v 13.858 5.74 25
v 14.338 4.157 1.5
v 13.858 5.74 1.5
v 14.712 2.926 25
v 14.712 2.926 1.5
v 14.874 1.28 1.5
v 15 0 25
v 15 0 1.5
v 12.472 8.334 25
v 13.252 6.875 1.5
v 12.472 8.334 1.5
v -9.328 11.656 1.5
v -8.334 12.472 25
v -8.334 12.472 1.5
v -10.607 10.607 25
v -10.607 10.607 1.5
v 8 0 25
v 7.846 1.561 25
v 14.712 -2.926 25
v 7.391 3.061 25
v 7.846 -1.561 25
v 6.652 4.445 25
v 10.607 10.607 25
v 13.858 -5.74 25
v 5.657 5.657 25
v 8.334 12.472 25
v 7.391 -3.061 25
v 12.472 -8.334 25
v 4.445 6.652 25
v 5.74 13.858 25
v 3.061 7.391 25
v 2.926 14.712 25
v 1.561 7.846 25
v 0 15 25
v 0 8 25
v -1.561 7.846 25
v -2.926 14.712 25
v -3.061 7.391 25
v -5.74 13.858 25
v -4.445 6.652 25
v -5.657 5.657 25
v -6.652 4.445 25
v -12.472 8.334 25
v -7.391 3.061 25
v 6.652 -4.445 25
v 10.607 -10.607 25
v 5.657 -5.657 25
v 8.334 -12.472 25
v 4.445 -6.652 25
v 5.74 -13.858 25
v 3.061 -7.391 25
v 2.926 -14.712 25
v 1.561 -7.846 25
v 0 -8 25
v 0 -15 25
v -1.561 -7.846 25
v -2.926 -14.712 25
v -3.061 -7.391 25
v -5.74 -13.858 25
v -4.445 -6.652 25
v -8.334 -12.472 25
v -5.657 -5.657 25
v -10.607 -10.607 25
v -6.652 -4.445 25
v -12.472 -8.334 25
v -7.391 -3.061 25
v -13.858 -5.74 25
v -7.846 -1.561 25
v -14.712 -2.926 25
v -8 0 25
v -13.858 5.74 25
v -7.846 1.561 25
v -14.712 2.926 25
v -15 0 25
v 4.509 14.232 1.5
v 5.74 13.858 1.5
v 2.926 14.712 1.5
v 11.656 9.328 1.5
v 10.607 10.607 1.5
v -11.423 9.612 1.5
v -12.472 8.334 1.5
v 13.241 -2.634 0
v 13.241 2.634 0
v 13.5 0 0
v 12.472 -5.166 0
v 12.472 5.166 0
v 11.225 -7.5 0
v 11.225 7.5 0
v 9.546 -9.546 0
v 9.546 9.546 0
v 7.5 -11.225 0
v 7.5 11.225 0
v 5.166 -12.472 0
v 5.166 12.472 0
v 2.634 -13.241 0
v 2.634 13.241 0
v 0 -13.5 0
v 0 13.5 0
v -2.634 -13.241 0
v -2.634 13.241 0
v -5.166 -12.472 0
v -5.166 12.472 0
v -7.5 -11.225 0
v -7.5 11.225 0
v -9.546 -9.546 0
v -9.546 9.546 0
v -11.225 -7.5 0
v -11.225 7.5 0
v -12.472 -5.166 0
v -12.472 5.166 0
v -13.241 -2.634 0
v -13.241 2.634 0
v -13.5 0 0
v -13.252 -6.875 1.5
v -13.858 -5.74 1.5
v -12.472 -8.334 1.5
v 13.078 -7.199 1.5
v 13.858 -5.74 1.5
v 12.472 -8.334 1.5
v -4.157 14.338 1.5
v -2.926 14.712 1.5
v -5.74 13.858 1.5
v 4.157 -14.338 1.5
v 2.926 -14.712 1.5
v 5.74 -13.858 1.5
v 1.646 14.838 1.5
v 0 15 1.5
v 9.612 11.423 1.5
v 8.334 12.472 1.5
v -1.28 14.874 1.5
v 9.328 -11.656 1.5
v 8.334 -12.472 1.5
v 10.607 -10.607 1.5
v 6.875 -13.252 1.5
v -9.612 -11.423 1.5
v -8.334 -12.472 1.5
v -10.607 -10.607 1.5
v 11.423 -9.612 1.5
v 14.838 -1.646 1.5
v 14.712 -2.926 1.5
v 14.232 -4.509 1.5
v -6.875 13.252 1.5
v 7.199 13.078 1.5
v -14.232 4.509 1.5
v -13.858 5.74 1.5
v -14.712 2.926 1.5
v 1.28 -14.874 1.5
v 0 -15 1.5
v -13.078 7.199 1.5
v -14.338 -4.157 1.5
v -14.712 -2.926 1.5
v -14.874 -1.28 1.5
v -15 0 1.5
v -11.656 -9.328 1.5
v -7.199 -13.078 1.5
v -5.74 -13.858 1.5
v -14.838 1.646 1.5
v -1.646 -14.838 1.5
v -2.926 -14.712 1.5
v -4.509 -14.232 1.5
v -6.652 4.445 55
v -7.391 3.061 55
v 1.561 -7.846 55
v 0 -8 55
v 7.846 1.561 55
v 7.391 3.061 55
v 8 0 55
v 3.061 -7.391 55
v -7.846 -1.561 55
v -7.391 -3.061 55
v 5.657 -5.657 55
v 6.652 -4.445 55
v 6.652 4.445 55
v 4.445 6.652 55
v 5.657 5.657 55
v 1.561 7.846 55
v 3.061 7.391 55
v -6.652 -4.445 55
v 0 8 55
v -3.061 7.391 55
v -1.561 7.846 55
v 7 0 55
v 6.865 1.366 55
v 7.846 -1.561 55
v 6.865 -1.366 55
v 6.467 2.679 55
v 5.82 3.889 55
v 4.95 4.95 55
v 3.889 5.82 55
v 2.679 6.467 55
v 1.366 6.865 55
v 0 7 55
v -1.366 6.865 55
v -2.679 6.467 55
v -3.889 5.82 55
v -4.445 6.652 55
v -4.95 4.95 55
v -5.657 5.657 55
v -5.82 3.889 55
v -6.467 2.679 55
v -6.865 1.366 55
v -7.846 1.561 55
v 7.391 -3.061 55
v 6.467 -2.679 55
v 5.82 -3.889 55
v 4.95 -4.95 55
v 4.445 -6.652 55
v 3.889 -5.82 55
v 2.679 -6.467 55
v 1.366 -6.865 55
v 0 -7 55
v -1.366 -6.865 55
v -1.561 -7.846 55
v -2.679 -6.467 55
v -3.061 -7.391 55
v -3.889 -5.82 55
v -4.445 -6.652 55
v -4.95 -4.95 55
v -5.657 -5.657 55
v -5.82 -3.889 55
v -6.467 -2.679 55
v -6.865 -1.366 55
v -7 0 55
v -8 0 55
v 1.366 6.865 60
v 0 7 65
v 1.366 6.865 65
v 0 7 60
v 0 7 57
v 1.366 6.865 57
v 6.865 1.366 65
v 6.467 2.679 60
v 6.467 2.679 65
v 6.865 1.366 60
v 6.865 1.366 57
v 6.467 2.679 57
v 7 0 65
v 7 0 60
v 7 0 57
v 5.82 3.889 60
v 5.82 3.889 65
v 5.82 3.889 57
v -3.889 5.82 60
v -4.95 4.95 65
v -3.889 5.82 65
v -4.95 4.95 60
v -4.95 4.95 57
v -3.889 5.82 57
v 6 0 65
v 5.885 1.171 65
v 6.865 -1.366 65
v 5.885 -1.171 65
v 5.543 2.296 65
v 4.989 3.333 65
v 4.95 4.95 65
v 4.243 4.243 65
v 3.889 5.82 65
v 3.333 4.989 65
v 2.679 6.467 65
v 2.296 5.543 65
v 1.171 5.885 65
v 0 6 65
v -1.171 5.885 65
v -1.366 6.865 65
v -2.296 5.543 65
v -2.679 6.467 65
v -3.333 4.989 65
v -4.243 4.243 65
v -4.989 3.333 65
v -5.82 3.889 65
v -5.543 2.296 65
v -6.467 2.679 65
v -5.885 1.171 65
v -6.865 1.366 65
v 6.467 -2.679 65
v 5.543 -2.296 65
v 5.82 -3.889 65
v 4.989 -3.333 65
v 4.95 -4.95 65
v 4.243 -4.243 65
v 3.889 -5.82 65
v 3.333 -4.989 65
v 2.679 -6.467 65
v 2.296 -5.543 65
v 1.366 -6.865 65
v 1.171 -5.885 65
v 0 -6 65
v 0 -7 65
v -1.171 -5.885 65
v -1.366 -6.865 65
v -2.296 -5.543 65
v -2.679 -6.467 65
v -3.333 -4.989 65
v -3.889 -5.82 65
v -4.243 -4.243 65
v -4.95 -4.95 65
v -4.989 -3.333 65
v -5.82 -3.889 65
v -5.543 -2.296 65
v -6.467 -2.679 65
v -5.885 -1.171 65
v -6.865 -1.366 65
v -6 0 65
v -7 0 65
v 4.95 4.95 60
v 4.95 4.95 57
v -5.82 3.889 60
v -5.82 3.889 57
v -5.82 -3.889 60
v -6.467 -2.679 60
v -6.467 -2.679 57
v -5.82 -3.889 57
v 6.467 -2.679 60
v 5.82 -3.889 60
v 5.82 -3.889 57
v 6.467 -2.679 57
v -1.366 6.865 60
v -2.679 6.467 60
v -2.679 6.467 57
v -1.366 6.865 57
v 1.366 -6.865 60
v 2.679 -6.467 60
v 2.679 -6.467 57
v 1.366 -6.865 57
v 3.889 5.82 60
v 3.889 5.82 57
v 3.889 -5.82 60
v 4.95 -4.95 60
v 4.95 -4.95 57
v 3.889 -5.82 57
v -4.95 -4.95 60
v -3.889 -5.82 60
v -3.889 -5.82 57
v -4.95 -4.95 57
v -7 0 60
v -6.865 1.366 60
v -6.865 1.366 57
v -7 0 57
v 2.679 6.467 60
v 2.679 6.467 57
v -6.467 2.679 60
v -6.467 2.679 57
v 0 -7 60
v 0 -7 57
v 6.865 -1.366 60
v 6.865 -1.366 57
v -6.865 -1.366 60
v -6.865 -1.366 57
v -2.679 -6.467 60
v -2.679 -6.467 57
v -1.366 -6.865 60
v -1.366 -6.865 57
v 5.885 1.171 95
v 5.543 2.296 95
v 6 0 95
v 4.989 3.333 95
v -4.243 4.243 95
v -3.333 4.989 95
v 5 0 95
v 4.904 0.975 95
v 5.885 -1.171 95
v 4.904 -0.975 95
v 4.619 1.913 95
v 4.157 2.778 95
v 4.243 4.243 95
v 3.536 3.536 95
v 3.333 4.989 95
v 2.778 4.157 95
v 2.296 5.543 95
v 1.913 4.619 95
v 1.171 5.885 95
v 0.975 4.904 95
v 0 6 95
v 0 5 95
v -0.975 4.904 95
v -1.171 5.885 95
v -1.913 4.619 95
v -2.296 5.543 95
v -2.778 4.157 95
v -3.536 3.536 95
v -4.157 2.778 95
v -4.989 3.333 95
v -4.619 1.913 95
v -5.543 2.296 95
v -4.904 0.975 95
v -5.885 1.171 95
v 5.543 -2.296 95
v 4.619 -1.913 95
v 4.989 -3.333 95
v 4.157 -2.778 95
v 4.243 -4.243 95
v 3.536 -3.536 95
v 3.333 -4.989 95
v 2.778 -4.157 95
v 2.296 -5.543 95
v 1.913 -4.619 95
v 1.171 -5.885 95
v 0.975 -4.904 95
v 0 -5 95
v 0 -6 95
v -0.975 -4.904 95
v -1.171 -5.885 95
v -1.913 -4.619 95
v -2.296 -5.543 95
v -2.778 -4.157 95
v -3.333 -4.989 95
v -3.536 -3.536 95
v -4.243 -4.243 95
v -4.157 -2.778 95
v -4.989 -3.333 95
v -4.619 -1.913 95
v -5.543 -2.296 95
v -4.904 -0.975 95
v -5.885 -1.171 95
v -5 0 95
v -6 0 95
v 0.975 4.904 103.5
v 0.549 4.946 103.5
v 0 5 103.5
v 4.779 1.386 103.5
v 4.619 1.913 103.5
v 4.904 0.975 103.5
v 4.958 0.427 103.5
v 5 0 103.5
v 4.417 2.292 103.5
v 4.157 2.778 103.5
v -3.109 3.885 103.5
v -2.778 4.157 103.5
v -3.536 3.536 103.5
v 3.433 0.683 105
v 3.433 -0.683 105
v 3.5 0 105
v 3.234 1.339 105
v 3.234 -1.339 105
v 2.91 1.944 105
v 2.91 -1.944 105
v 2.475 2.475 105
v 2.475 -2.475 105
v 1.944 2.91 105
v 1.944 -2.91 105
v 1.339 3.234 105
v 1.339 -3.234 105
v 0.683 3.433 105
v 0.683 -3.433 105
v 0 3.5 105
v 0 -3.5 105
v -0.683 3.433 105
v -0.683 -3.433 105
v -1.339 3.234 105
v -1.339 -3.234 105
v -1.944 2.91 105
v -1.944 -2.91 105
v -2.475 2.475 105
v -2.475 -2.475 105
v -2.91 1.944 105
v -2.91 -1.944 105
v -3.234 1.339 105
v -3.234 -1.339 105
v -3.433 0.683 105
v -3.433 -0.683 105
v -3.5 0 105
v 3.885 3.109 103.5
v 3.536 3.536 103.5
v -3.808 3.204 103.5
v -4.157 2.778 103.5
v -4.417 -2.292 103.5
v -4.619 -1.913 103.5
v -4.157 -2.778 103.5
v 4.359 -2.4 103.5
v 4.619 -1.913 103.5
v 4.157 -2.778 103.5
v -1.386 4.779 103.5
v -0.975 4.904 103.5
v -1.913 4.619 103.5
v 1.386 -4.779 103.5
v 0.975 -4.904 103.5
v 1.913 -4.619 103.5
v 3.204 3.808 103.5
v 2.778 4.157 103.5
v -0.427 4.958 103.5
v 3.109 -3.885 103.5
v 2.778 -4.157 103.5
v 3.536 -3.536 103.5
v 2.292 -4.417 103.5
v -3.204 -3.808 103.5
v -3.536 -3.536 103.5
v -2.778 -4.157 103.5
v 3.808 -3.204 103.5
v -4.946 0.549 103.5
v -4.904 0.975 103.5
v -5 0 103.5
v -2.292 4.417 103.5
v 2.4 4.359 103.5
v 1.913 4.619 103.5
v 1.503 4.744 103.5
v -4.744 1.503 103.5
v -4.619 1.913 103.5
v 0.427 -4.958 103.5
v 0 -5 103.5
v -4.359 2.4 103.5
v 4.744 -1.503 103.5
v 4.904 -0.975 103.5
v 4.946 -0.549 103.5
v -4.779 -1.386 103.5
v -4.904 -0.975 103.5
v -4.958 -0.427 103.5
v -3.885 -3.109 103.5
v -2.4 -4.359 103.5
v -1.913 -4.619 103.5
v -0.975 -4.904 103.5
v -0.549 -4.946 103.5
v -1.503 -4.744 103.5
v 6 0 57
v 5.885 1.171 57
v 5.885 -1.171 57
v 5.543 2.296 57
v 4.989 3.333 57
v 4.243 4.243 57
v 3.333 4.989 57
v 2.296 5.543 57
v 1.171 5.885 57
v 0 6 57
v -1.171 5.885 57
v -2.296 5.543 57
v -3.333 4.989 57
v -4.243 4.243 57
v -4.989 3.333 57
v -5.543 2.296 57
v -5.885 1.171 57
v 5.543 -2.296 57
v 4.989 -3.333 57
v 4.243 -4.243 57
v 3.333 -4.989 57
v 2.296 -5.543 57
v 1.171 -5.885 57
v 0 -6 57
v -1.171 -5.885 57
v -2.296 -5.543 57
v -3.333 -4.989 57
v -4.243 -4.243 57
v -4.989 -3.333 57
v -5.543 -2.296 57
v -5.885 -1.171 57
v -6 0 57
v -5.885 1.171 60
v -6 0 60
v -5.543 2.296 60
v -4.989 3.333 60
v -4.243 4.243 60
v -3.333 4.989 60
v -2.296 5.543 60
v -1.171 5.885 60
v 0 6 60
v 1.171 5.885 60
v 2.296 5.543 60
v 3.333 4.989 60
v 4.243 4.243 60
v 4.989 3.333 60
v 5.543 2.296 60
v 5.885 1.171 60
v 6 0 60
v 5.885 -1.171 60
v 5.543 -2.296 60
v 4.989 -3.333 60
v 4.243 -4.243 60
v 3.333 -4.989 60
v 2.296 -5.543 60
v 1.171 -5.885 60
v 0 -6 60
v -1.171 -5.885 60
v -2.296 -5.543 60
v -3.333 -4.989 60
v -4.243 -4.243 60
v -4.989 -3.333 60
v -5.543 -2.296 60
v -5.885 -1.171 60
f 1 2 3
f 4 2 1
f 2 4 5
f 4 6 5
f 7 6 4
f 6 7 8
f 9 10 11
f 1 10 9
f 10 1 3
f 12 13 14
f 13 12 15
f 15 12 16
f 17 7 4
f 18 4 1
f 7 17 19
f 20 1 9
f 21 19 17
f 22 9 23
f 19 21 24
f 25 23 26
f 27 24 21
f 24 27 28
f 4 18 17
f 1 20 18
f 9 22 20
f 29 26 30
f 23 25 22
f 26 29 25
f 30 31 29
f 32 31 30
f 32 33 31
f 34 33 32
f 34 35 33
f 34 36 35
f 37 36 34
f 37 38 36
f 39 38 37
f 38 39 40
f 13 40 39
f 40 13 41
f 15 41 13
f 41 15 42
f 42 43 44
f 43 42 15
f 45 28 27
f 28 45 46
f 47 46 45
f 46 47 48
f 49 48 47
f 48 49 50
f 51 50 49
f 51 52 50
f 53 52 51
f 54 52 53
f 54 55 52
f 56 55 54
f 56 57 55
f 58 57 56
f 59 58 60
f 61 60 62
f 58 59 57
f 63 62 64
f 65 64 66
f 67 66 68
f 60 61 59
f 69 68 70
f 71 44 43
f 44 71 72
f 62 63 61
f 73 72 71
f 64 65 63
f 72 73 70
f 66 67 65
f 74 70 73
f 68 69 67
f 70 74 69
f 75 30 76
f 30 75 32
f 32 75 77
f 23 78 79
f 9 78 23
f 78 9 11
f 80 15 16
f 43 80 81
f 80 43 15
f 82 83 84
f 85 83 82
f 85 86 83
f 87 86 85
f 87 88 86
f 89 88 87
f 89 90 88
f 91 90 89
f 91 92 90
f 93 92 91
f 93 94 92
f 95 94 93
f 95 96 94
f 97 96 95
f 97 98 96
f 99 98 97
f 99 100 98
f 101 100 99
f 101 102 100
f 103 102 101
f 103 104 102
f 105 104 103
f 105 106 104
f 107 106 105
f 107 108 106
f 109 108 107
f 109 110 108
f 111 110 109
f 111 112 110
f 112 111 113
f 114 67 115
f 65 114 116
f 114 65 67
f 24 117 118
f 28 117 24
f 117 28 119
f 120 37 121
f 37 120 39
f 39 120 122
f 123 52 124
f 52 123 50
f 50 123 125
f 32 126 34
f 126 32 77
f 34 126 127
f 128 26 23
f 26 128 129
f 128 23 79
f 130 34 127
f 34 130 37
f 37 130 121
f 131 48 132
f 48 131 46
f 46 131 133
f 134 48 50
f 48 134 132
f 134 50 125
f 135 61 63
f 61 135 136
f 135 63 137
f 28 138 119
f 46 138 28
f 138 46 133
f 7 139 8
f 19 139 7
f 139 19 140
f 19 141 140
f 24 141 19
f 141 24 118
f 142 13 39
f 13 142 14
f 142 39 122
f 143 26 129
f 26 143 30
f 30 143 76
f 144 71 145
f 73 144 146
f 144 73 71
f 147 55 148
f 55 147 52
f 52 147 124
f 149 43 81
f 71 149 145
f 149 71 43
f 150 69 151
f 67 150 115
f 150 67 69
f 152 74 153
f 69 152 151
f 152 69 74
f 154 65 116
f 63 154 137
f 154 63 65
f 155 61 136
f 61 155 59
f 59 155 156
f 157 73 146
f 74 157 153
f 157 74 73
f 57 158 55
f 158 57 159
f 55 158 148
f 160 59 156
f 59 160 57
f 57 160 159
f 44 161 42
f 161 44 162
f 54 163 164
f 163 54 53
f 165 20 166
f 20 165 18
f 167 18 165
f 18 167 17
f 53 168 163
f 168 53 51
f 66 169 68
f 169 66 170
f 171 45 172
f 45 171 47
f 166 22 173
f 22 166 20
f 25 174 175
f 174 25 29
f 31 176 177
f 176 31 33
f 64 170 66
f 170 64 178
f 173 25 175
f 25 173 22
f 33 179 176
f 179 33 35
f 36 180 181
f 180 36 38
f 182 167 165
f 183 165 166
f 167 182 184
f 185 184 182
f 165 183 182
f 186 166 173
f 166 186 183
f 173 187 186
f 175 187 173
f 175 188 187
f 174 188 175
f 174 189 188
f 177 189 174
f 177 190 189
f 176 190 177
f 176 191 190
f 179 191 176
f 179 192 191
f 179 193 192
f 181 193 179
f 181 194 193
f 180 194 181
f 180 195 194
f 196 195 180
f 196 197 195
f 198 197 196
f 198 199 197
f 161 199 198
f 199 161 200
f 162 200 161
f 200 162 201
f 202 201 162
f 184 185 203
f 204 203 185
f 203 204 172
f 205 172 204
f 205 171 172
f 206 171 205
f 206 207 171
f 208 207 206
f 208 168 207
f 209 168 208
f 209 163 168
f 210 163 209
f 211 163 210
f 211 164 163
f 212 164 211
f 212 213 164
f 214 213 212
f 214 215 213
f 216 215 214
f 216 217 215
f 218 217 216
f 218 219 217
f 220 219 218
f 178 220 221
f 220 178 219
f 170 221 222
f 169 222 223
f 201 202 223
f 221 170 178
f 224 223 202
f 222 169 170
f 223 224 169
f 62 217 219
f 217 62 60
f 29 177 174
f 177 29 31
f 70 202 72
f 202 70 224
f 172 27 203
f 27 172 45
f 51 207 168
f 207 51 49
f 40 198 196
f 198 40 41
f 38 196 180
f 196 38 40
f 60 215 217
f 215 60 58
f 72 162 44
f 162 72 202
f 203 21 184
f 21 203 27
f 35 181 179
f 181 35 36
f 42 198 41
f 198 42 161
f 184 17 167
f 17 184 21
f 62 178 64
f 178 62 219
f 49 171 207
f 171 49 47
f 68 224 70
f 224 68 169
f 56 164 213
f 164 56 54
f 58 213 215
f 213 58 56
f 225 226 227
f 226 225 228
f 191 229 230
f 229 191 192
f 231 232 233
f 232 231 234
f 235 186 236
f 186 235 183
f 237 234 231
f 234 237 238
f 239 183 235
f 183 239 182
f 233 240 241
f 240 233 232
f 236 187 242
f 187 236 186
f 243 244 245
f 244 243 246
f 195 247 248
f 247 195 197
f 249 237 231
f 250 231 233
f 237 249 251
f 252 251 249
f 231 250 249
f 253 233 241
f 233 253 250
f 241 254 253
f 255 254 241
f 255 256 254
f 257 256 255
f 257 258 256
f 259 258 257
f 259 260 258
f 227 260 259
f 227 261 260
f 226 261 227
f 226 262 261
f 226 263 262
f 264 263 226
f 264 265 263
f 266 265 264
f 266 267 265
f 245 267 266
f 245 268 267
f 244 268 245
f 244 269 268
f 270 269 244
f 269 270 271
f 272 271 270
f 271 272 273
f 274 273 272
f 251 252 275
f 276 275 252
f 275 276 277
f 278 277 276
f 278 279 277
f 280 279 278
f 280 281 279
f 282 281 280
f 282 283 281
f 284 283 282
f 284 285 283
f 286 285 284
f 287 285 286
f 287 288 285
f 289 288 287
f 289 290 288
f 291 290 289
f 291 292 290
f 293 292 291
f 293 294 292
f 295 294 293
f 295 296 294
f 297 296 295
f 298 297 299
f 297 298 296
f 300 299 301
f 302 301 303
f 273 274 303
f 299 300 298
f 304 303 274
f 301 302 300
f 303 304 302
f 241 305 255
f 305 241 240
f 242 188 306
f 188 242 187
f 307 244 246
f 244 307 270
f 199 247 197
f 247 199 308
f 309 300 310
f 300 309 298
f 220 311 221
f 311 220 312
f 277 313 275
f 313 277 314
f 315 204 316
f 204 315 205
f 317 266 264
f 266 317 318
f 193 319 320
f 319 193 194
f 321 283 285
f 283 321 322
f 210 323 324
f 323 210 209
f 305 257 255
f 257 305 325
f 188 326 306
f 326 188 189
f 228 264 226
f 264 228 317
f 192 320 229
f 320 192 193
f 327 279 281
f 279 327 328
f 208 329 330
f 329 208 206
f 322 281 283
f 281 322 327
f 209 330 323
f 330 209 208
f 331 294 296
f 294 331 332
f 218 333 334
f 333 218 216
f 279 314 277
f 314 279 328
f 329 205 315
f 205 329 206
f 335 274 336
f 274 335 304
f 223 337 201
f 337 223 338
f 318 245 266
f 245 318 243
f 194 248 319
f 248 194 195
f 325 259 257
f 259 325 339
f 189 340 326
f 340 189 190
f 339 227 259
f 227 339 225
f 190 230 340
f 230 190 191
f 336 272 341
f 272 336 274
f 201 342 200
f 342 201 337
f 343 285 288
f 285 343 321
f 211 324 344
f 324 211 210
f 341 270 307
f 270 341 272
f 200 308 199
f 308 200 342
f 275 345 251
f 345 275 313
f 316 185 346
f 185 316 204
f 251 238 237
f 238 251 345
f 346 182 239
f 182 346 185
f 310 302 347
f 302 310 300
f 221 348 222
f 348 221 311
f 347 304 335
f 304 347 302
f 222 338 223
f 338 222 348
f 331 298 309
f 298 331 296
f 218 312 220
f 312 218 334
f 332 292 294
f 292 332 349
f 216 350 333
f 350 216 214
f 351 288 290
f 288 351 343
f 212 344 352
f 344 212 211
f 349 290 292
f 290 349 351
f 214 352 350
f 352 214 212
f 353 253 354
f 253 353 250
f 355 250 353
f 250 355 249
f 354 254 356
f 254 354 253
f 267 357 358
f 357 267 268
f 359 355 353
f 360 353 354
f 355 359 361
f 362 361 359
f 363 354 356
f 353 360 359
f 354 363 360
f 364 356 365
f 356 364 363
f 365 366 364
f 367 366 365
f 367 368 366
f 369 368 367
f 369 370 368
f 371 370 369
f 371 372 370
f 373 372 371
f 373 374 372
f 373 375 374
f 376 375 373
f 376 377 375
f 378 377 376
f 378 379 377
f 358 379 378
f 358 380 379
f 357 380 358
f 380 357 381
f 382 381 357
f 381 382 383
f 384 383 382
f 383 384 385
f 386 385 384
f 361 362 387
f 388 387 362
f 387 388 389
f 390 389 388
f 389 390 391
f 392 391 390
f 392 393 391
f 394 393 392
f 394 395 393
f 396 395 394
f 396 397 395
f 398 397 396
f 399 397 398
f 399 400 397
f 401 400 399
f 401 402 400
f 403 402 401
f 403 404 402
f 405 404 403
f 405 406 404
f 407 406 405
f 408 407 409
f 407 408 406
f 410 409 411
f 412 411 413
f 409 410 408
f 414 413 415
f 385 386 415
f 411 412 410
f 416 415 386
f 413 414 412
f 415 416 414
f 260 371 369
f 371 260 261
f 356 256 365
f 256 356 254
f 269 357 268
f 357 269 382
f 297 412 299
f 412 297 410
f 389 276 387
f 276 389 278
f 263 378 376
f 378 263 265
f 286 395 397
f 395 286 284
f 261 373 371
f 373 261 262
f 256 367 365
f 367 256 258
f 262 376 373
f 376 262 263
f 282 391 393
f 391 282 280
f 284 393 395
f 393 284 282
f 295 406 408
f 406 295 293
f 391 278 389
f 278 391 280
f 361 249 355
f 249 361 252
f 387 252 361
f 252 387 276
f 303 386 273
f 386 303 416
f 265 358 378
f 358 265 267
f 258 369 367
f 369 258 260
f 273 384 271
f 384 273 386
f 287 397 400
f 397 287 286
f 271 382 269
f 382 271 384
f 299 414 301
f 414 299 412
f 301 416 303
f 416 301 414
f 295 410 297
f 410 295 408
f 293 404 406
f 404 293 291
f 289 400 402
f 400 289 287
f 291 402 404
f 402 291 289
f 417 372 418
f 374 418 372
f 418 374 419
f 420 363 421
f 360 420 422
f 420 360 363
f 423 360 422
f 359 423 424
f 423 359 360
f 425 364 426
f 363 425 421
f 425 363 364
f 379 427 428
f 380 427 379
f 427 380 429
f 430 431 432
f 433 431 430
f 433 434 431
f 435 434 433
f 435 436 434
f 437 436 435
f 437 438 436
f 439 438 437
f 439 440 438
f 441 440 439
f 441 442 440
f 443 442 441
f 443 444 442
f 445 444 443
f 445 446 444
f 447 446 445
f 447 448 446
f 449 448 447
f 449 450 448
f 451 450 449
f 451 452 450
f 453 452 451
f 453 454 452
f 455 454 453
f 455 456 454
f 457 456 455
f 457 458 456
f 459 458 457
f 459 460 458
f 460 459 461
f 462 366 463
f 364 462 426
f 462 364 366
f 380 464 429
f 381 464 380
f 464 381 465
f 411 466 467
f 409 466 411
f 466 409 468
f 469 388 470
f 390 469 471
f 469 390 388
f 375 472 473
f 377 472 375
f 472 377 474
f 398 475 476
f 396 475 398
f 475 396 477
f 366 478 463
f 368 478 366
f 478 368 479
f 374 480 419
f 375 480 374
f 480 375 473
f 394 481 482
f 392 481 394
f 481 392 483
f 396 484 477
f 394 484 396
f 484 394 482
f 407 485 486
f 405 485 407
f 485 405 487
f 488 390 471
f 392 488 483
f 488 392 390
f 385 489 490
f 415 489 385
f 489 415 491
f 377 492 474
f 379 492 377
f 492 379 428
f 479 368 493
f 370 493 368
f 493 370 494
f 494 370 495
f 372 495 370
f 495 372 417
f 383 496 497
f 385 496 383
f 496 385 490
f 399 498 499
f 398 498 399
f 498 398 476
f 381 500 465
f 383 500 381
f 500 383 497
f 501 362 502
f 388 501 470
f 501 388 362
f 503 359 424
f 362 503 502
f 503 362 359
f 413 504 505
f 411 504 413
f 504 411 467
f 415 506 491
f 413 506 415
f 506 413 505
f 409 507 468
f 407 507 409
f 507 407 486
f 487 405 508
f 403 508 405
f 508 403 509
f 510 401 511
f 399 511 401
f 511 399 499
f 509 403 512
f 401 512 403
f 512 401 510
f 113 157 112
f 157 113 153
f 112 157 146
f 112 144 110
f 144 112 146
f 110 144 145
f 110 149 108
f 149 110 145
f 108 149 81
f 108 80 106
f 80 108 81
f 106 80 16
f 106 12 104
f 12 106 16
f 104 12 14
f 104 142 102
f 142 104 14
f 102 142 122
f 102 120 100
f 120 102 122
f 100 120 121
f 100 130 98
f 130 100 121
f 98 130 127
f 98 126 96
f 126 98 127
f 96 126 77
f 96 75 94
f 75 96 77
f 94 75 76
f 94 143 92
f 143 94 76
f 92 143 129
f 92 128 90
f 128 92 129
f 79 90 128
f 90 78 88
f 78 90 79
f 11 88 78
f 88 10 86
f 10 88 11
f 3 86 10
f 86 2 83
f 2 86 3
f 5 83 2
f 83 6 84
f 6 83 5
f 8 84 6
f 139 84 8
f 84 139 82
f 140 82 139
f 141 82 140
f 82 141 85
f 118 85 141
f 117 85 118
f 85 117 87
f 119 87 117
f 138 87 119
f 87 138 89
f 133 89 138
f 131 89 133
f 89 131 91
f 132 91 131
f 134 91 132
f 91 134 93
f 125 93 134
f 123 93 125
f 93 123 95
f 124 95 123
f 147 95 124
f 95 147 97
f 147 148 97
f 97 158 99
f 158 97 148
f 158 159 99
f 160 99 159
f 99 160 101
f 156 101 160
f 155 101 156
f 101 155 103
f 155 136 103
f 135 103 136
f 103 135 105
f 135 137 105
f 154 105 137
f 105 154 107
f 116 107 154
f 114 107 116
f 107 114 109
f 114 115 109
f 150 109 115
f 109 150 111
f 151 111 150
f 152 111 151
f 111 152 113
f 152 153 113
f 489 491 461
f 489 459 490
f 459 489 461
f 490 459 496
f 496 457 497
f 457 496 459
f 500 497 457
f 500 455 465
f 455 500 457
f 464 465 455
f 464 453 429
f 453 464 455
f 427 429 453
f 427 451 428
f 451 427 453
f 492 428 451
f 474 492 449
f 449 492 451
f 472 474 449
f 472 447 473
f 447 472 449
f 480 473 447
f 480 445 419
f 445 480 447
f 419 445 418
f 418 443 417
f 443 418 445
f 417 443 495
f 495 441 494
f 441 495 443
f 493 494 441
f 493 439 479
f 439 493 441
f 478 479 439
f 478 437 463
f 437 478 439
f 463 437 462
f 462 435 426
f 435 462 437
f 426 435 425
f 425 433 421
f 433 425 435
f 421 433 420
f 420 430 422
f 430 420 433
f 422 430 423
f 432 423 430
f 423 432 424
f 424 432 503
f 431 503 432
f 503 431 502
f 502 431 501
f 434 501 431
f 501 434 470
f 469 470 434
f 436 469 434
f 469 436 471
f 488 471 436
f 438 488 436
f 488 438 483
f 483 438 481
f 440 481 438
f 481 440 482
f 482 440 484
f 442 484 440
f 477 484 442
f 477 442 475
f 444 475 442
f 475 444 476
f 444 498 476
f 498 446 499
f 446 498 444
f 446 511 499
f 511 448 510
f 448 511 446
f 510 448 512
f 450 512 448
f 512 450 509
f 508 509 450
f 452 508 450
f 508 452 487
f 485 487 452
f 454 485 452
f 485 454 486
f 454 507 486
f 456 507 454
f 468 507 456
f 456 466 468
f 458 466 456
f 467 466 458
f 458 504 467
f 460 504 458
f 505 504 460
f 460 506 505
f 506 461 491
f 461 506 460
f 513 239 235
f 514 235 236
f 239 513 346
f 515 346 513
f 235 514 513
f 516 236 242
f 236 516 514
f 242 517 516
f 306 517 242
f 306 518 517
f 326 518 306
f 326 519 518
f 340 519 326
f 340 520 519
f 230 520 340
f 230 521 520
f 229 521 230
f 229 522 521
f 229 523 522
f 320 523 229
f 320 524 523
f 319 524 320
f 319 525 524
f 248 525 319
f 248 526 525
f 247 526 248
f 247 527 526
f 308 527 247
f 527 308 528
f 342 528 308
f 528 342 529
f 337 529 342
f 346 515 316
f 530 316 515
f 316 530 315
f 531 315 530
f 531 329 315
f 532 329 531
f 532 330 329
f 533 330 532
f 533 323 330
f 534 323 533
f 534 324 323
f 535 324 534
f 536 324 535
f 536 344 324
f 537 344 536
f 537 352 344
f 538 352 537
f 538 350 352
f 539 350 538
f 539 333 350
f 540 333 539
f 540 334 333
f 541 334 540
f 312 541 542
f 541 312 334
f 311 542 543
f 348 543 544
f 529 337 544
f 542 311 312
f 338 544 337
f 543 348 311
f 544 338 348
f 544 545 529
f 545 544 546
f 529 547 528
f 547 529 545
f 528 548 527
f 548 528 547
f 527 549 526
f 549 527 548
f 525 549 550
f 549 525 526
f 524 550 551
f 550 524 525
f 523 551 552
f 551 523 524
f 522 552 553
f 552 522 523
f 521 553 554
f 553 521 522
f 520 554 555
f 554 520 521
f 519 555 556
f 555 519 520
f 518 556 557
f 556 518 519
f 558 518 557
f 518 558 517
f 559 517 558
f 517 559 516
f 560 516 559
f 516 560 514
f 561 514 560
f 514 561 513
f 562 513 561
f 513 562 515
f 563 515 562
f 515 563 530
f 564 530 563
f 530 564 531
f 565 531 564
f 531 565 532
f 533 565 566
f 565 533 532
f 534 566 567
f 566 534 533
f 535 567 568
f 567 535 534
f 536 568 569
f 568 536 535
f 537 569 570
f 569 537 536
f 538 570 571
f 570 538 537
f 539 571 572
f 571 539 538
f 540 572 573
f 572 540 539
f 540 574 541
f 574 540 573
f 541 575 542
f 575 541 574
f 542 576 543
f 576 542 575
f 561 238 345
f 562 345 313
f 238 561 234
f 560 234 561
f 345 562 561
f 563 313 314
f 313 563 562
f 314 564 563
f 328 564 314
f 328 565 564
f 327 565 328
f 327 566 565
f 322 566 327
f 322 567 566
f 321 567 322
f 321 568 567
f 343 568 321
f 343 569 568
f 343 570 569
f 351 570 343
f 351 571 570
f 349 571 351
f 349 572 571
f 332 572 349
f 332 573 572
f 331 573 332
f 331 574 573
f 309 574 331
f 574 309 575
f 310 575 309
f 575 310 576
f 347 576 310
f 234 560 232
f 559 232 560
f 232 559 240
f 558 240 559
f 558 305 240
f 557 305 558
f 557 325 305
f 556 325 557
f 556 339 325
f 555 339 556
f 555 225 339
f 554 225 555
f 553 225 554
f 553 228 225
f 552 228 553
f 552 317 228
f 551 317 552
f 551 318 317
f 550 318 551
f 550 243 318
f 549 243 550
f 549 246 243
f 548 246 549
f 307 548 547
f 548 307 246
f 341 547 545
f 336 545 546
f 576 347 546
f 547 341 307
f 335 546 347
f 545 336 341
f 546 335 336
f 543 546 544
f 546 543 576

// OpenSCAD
$fn = 32;

// ----------------------------------------------------------------------
// Stepped shaft: diameters 30, 16, 14, 12, 10 mm, 105 mm long
// ----------------------------------------------------------------------

// --- parameters (mm) ---
d1 = 30;                  // step 1 diameter
len1 = 25;                // step 1 length
d2 = 16;                  // step 2 diameter
len2 = 30;                // step 2 length
d3 = 14;                  // step 3 diameter
len3 = 10;                // step 3 length
d4 = 12;                  // step 4 diameter
len4 = 30;                // step 4 length
d5 = 10;                  // step 5 diameter
len5 = 10;                // step 5 length
total = 105;              // overall length
chamfer = 1.5;            // end chamfer
groove_r = 7;             // groove radius
groove_z = 57;            // groove position from the end
groove_w = 3;             // groove width
groove_d = 1;             // groove depth

difference() {
  /* turned body: stacked cylinders, every step sunk into the bigger one */
  union() {
    cylinder(h = len1, d = d1);
    translate([0, 0, 24.6]) cylinder(h = 30.4, d = d2);
    translate([0, 0, 54.6]) cylinder(h = 10.4, d = d3);
    translate([0, 0, 64.6]) cylinder(h = 30.4, d = d4);
    translate([0, 0, 94.6]) cylinder(h = 10.4, d = d5);
  }
  /* bottom chamfer ring cut */
  rotate_extrude() translate([13.5, -2.5]) polygon([[0, 0], [4, 0], [4, 6.5], [0, 2.5]]);
  /* top chamfer ring cut */
  rotate_extrude() translate([3.5, 105]) polygon([[0, 0], [4, -4], [4, 2.5], [0, 2.5]]);
  /* circlip groove just behind the shoulder */
  rotate_extrude() translate([groove_r - groove_d, groove_z]) square([groove_d + 2.5, groove_w]);
}
